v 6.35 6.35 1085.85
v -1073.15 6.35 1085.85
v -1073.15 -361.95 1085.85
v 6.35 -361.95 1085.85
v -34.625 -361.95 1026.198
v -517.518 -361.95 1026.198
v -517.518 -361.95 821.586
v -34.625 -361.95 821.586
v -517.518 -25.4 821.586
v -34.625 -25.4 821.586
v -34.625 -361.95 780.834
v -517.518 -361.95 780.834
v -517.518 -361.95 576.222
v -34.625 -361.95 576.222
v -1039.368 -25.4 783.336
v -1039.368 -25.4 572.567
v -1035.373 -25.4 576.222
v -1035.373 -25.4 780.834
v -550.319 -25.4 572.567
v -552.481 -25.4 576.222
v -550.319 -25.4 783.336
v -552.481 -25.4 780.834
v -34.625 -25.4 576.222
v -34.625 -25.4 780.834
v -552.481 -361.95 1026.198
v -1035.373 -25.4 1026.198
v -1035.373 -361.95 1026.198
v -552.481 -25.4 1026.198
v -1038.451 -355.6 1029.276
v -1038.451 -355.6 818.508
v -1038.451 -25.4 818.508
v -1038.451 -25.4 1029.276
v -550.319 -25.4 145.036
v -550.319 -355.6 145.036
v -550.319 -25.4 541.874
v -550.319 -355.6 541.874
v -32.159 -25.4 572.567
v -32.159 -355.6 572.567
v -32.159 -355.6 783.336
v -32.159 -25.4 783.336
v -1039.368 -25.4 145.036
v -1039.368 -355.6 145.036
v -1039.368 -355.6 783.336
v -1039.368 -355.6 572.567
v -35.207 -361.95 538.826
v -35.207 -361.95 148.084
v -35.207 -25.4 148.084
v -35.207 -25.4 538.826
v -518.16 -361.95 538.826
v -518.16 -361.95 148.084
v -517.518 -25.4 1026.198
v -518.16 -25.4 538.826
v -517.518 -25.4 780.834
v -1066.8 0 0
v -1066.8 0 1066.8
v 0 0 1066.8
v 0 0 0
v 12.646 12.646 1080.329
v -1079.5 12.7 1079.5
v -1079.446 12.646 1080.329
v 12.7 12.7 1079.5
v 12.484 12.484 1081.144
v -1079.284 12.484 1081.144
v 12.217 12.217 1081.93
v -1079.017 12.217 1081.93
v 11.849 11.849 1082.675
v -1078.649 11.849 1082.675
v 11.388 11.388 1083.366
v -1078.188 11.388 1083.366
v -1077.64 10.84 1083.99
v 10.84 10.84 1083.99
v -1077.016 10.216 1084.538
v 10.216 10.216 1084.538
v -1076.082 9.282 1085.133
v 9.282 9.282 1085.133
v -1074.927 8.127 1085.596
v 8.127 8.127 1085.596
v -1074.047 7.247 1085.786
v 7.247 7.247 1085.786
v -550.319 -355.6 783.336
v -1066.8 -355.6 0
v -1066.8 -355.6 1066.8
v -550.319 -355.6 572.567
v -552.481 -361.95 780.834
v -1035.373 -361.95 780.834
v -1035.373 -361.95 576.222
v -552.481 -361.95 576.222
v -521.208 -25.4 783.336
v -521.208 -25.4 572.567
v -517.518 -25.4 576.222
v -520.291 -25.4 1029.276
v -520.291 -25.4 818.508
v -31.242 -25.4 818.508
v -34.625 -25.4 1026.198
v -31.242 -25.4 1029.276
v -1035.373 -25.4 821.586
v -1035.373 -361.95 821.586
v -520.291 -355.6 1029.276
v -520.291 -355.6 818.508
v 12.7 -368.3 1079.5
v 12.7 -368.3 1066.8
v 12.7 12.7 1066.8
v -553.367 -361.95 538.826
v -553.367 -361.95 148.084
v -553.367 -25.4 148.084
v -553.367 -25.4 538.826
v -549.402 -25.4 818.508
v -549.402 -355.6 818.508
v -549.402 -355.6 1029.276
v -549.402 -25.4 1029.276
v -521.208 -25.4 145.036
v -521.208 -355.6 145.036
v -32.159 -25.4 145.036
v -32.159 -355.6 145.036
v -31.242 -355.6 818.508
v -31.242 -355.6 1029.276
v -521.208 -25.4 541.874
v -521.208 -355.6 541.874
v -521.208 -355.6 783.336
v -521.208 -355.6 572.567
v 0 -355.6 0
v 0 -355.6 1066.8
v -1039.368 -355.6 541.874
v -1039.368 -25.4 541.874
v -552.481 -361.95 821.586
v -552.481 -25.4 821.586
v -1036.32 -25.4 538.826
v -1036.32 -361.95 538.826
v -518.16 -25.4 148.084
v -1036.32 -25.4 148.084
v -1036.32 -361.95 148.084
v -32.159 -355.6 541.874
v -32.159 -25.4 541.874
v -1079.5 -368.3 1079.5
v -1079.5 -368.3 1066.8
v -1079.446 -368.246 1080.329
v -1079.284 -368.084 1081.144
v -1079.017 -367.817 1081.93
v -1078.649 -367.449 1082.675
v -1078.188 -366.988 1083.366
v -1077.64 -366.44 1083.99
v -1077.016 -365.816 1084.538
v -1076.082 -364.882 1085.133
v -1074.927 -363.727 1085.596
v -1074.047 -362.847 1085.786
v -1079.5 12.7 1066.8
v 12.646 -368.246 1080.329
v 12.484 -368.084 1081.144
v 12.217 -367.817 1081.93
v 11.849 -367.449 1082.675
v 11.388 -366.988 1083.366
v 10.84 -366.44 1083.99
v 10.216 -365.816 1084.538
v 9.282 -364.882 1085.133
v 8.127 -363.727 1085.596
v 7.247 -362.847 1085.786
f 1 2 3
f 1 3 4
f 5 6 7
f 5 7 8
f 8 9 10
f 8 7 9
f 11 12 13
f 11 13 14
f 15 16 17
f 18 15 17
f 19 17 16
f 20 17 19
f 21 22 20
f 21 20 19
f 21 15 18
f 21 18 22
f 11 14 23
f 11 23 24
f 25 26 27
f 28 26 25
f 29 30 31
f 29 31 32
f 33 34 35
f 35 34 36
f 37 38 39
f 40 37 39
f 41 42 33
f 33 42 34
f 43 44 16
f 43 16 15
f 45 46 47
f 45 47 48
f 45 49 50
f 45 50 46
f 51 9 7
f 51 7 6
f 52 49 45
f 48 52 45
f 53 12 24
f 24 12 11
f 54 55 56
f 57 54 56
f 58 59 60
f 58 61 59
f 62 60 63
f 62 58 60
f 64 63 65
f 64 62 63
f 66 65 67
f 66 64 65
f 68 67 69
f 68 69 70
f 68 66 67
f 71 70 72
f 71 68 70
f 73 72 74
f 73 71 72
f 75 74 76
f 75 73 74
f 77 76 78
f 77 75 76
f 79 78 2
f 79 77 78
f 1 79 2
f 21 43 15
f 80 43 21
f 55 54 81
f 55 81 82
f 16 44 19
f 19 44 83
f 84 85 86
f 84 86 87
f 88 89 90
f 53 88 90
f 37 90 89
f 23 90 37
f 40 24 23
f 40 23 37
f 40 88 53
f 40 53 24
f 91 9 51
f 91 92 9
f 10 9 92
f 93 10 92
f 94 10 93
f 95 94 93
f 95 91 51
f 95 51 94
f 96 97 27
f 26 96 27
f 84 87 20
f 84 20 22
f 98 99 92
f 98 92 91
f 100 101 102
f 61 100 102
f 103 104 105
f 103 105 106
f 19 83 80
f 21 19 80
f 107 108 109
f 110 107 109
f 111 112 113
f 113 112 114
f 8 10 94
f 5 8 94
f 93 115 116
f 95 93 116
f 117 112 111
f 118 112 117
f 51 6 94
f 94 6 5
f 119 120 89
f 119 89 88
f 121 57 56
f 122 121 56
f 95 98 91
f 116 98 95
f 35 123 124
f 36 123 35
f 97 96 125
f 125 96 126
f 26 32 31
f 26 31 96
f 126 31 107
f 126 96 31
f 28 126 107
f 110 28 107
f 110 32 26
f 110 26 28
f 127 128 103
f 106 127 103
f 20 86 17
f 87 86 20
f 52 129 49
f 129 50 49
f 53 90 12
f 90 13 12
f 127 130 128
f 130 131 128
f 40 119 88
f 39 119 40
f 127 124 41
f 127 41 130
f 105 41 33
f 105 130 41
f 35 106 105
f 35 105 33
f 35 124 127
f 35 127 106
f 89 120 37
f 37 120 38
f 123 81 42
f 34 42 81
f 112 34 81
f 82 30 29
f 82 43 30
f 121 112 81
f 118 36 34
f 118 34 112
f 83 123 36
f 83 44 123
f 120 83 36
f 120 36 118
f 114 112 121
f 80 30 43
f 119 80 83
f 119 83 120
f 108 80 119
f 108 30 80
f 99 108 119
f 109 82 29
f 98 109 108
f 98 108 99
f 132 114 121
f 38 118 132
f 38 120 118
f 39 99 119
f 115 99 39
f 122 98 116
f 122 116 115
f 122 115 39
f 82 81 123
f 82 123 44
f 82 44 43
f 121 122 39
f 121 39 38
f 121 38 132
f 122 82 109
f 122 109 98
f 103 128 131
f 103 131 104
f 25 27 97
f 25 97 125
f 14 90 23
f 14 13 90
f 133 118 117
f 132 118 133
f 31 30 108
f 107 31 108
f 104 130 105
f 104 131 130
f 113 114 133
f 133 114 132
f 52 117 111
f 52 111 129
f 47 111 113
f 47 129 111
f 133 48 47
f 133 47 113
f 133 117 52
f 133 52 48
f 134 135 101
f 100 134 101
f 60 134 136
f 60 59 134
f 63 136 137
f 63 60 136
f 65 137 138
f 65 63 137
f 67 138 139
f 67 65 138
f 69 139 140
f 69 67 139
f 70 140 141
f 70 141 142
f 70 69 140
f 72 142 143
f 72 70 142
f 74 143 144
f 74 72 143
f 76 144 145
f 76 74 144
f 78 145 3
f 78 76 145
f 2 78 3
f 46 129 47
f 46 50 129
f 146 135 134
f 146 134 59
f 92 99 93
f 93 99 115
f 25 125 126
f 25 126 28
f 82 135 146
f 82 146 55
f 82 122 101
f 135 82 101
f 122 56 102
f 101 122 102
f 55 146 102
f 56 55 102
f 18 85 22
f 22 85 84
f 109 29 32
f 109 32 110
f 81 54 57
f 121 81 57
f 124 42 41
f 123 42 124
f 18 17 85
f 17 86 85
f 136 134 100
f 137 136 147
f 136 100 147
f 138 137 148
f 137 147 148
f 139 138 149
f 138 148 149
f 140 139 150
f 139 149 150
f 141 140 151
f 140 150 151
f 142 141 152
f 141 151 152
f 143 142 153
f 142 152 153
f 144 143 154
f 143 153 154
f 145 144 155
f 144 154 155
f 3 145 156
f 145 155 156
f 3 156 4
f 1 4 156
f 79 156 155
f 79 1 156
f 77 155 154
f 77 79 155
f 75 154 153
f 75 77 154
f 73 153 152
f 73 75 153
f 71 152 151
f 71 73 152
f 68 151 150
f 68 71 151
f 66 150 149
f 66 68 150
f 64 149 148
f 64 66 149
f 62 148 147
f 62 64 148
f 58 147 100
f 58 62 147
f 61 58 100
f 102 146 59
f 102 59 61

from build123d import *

# Parameters (mm, degrees)
F0_W          = 1066.8
F0_H          = 1066.8
F1_DEPTH      = 355.6
F2_W          = 1092.2
F2_H          = 381
F3_DEPTH      = 19.05
F4_R          = 6.35
F5_W          = 489.0489578247
F5_H          = 210.7685804367
F5_H_2        = 396.8377411366
F6_DEPTH      = 330.2
F7_W          = 482.892036438
F7_H          = 204.61165905
F7_W_2        = 482.9529523849
F7_H_2        = 390.7417356968
F8_DEPTH      = 330.2
F8_DEPTH_BACK = 6.35


with BuildPart() as f1:
    # F0 (on Front) → F1 (new body)
    with BuildSketch(Plane.XZ):
        with Locations((-533.4, 533.4)):
            Rectangle(F0_W, F0_H)
    extrude(amount=F1_DEPTH)

    # F2 (on face) → F3 (join)
    with BuildSketch(Plane.XY.offset(1066.8)):
        with Locations((-533.4, -177.8)):
            Rectangle(F2_W, F2_H)
    extrude(amount=F3_DEPTH)

    # F4
    f4_edges = [f1.edges().sort_by_distance(p)[0] for p in [
        (-533.4, 12.7, 1085.85),
        (-1079.5, -177.8, 1085.85),
        (-533.4, -368.3, 1085.85),
        (12.7, -177.8, 1085.85),
    ]]
    fillet(f4_edges, radius=F4_R)

    # F5 (on face) → F6 (cut)
    with BuildSketch(Plane.XZ.offset(355.6)):
        with Locations((-793.9267158508, 923.8921999931)):
            Rectangle(F5_W, F5_H)
        with Locations((-275.7667158508, 923.8921999931)):
            Rectangle(F5_W, F5_H)
        with Locations((-276.6835210876, 677.9517097816)):
            Rectangle(F5_W, F5_H)
        with Locations((-794.8435210876, 677.9517097816)):
            Rectangle(F5_W, F5_H)
        with Locations((-794.8435210876, 343.4552997351)):
            Rectangle(F5_W, F5_H_2)
        with Locations((-276.6835210876, 343.4552997351)):
            Rectangle(F5_W, F5_H_2)
    extrude(amount=-F6_DEPTH, mode=Mode.SUBTRACT)

    # F7 (on face) → F8 (join, two sides)
    with BuildSketch(Plane.XZ.offset(355.6)) as f8_sk:
        with Locations((-793.9267158508, 923.8921999931)):
            Rectangle(F7_W, F7_H)
        with Locations((-793.9267158508, 678.5281999931)):
            Rectangle(F7_W, F7_H)
        with Locations((-276.0715158508, 923.8921999931)):
            Rectangle(F7_W, F7_H)
        with Locations((-276.0715158508, 678.5281999931)):
            Rectangle(F7_W, F7_H)
        with Locations((-794.8435210876, 343.4552997351)):
            Rectangle(F7_W_2, F7_H_2)
        with Locations((-276.6835210876, 343.4552997351)):
            Rectangle(F7_W_2, F7_H_2)
    extrude(amount=-F8_DEPTH)
    extrude(f8_sk.sketch, amount=F8_DEPTH_BACK)


solid = f1.part
